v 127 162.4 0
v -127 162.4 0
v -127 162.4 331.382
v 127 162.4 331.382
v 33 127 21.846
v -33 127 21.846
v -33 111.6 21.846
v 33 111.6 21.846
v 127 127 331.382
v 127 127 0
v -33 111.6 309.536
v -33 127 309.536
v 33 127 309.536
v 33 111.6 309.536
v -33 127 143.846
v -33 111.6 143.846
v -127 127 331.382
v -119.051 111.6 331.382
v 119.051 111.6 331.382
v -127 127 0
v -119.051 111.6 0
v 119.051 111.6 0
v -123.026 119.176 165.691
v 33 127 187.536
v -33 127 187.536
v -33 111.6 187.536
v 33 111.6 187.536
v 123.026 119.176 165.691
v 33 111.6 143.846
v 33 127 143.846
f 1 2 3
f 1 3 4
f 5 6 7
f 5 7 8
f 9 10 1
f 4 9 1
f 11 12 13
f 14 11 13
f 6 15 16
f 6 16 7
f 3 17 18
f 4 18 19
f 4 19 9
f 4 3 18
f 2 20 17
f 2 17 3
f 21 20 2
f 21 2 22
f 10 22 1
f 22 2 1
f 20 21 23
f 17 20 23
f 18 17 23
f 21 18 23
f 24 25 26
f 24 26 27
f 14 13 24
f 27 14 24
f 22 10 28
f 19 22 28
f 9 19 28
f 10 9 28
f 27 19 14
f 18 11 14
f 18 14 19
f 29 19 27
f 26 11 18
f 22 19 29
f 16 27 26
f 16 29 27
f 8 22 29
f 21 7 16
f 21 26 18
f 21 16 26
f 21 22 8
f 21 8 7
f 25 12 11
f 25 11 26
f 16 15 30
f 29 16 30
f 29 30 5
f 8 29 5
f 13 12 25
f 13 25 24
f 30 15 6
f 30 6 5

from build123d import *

# Parameters (mm, degrees)
BOSS_EXTRUDE2_DEPTH = 331.382
SKETCH3_W           = 66
SKETCH3_H           = 122
CUT_EXTRUDE2_DEPTH  = 128.0000001
SKETCH4_W           = 240
SKETCH4_H           = 111.6
CUT_EXTRUDE3_DEPTH  = 332.3820001
SKETCH5_W           = 254
SKETCH5_H           = 35.4
BOSS_EXTRUDE3_DEPTH = 331.382


with BuildPart() as part:
    # Sketch2 → Boss-Extrude2 (new body)
    with BuildSketch(Plane.XY):
        with BuildLine():
            Line((-127, 127), (127, 127))
            add(Edge.make_bspline(
                [(-127, 127), (0, -127), (127, 127)],
                knots=[0.056028396, 0.056028396, 0.056028396, 0.943971604, 0.943971604, 0.943971604], degree=2))
        make_face()
    extrude(amount=BOSS_EXTRUDE2_DEPTH)

    # Sketch3 → Cut-Extrude2 (cut, through all)
    with BuildSketch(Plane(origin=(0, 127, 0), x_dir=(1, 0, 0), z_dir=(0, 1, 0))):
        with Locations((0, -82.8455)):
            Rectangle(SKETCH3_W, SKETCH3_H)
        with Locations((0, -248.5365)):
            Rectangle(SKETCH3_W, SKETCH3_H)
    extrude(amount=-CUT_EXTRUDE2_DEPTH, mode=Mode.SUBTRACT)

    # Sketch4 → Cut-Extrude3 (cut, through all)
    with BuildSketch(Plane(origin=(0, 0, 0), x_dir=(-1, 0, 0), z_dir=(0, 0, -1))):
        with Locations((0, 55.8)):
            Rectangle(SKETCH4_W, SKETCH4_H)
    extrude(amount=-CUT_EXTRUDE3_DEPTH, mode=Mode.SUBTRACT)

    # Sketch5 → Boss-Extrude3 (add)
    with BuildSketch(Plane.XY.offset(331.382)):
        with Locations((0, 144.7)):
            Rectangle(SKETCH5_W, SKETCH5_H)
    extrude(amount=-BOSS_EXTRUDE3_DEPTH)


solid = part.part
